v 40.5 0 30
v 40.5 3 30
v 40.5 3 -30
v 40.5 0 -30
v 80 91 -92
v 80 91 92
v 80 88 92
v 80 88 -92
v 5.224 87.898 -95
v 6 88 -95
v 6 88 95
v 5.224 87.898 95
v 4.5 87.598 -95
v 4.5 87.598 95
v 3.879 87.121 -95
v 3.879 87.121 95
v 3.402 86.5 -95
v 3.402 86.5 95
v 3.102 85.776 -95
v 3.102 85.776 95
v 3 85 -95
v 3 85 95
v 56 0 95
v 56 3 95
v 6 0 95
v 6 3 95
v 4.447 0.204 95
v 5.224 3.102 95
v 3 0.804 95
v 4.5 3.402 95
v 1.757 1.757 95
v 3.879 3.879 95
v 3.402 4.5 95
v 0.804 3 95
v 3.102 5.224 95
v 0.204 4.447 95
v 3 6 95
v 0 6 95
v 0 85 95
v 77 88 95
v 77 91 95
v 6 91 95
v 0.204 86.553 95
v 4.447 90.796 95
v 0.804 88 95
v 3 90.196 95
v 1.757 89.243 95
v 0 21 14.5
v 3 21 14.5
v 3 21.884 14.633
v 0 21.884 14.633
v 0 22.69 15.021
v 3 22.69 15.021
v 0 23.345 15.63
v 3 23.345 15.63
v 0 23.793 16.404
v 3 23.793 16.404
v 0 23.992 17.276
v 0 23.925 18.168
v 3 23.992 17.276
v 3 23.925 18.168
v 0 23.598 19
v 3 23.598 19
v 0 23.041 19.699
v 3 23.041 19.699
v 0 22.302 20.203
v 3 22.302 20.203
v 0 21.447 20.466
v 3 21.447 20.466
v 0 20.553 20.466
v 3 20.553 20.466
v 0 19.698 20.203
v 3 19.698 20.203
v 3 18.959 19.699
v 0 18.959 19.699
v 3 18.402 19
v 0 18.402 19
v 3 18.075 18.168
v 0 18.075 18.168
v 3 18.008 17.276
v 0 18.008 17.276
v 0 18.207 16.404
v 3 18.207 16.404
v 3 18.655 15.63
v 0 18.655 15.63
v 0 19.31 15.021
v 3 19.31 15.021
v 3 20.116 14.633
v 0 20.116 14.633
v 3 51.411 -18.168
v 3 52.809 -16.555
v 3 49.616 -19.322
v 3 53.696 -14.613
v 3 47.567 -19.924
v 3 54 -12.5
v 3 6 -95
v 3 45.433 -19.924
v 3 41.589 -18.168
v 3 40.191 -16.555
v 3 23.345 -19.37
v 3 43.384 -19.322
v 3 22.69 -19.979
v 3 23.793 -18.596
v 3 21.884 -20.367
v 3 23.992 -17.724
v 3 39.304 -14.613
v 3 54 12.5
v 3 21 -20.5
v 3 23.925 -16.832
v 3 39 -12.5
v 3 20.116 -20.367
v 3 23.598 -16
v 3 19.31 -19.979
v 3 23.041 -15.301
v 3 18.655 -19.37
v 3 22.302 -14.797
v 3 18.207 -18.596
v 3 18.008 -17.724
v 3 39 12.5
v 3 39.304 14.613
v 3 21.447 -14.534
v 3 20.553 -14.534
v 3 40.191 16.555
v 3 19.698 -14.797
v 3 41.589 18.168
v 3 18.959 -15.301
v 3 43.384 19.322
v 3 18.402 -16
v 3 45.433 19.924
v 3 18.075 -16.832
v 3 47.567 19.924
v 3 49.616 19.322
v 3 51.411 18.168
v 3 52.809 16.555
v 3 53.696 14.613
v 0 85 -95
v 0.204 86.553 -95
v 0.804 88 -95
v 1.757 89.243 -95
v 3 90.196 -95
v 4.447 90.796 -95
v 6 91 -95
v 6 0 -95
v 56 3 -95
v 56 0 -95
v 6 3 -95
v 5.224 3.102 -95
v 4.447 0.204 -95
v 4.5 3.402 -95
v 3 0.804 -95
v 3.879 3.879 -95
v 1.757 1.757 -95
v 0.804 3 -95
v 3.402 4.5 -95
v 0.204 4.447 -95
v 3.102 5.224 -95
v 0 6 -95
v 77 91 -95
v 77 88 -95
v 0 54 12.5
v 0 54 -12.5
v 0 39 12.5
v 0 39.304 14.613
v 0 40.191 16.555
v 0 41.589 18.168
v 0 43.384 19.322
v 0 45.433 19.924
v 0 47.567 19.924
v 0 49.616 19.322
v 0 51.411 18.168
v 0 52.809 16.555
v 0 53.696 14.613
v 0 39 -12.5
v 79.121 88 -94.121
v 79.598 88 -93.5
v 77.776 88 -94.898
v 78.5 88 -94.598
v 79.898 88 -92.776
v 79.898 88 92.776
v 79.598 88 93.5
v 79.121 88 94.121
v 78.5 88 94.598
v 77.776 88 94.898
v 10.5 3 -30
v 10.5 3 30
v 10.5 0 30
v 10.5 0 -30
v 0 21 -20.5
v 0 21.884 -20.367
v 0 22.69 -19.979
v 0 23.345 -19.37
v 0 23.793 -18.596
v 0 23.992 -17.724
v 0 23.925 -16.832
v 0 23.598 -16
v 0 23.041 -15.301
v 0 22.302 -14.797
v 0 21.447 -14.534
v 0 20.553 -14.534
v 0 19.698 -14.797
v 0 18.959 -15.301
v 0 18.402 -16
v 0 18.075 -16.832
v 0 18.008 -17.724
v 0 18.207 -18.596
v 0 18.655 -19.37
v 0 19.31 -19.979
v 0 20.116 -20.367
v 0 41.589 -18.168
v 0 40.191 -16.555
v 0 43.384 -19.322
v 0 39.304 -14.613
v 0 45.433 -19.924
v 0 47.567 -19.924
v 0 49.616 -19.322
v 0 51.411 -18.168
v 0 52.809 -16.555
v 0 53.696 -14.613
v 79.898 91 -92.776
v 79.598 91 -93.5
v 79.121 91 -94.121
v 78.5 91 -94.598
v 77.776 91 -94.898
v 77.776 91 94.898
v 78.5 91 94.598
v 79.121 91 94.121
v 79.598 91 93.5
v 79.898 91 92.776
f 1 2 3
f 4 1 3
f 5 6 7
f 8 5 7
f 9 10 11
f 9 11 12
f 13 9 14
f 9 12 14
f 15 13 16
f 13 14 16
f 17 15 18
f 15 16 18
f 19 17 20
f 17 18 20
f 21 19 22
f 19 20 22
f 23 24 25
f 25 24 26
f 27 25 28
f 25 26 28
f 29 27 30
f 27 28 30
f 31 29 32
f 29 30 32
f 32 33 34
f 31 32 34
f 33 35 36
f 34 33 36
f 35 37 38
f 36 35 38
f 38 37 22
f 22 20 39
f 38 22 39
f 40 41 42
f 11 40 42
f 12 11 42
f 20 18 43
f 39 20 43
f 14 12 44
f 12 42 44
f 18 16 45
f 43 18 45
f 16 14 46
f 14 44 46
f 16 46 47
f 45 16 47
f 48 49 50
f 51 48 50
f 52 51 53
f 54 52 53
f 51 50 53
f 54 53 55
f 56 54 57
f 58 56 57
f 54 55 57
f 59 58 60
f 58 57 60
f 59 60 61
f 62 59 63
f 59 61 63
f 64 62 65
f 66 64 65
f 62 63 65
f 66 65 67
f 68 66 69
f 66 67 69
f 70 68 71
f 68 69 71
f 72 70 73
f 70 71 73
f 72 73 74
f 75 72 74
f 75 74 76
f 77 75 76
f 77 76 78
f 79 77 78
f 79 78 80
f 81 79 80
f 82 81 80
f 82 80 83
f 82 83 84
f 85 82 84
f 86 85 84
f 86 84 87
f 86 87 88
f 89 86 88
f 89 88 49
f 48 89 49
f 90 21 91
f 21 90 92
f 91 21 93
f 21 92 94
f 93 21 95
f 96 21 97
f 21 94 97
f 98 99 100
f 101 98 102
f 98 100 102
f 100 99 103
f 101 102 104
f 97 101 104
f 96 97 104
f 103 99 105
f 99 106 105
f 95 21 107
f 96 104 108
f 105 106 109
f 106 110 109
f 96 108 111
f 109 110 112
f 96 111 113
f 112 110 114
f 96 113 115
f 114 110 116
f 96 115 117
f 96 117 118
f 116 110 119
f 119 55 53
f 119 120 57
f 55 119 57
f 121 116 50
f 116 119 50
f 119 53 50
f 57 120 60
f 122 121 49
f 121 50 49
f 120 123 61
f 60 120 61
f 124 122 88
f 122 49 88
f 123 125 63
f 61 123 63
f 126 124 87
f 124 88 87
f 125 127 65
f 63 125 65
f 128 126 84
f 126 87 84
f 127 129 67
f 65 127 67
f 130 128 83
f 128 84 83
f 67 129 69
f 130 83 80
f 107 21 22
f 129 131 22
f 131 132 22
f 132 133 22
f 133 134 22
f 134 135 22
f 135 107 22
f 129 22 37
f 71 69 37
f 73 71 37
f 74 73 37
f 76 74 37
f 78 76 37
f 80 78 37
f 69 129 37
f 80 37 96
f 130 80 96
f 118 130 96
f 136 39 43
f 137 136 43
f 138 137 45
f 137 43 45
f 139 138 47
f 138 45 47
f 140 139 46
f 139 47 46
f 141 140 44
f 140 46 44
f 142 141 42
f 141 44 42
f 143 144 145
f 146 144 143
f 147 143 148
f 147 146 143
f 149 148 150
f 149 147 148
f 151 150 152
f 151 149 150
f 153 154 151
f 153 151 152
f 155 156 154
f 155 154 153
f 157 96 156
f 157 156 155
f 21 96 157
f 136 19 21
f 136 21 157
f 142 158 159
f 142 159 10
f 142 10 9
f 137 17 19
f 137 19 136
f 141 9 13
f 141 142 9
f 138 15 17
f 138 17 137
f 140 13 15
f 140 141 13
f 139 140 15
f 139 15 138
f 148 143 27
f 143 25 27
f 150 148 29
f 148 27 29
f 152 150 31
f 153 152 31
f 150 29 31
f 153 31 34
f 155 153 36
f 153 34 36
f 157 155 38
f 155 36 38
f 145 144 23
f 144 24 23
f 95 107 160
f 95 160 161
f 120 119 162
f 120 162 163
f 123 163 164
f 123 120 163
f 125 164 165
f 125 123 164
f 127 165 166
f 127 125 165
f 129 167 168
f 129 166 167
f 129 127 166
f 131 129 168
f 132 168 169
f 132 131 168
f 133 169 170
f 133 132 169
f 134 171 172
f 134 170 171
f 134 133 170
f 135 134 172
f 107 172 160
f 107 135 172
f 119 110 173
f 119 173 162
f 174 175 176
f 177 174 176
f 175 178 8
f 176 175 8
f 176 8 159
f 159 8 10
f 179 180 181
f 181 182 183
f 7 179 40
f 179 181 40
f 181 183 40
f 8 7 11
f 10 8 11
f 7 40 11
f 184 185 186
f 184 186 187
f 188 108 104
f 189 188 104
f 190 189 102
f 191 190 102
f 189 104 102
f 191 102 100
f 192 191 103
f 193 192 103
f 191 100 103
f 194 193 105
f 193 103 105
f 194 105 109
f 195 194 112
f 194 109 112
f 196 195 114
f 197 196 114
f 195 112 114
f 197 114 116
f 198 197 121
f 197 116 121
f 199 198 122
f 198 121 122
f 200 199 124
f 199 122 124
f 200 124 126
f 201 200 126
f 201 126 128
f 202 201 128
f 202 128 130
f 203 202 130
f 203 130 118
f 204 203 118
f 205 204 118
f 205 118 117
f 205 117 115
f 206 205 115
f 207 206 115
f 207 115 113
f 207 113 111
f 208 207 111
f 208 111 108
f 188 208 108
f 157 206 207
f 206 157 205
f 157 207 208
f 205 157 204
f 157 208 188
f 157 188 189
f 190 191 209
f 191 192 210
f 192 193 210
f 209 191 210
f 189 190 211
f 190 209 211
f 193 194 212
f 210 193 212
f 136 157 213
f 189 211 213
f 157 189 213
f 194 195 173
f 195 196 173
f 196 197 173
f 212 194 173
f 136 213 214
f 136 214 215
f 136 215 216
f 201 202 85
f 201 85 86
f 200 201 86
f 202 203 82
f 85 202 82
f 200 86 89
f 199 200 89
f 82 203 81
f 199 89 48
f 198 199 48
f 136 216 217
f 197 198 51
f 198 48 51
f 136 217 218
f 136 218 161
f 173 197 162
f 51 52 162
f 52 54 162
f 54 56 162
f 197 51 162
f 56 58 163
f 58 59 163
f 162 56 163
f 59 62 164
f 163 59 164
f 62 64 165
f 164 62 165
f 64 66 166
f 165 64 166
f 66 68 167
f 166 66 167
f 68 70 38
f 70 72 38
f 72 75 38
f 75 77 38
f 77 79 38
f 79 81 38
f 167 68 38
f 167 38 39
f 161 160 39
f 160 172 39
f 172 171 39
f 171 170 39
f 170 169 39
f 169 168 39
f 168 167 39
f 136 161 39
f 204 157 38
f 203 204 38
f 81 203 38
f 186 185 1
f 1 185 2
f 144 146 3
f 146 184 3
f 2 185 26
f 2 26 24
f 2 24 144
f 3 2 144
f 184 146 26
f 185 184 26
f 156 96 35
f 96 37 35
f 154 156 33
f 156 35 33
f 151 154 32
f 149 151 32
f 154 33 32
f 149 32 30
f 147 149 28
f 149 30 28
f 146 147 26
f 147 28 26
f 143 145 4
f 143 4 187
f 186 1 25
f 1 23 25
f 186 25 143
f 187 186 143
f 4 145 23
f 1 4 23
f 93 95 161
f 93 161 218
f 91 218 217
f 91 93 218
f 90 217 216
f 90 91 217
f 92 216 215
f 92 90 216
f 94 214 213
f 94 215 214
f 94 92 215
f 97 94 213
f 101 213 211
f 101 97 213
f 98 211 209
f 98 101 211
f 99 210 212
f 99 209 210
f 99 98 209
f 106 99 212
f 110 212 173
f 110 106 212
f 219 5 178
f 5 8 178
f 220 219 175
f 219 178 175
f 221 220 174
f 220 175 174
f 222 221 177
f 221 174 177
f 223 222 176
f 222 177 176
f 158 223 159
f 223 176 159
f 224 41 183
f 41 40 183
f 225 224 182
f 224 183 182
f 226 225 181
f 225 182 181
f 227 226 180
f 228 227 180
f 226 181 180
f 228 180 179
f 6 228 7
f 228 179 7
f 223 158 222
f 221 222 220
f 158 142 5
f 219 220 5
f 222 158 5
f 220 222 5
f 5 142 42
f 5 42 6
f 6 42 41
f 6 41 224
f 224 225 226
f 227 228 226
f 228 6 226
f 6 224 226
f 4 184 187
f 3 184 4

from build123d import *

# Parameters (mm, degrees)
BOSS_EXTRUDE1_DEPTH = 95
FILLET2_R           = 3
CUT_EXTRUDE2_REACH  = 154.43
CUT_EXTRUDE4_REACH  = 154.214
SKETCH7_W           = 30
SKETCH7_H           = 60
CUT_EXTRUDE5_REACH  = 154.43
SKETCH2_R           = 3


with BuildPart() as part:
    # Sketch1 → Boss-Extrude1 (new, symmetric)
    with BuildSketch(Plane.XY):
        with BuildLine():
            Line((6, 91), (80, 91))
            Line((80, 91), (80, 88))
            Line((80, 88), (6, 88))
            ThreePointArc((6, 88), (3.878679656, 87.121320344), (3, 85))
            Line((3, 85), (3, 6))
            ThreePointArc((3, 6), (3.878679656, 3.878679656), (6, 3))
            Line((6, 3), (56, 3))
            Line((56, 3), (56, 0))
            Line((56, 0), (6, 0))
            ThreePointArc((6, 0), (1.757359313, 1.757359313), (0, 6))
            Line((0, 6), (0, 85))
            ThreePointArc((0, 85), (1.757359313, 89.242640687), (6, 91))
        make_face()
    extrude(amount=BOSS_EXTRUDE1_DEPTH, both=True)

    # Fillet2
    fillet2_edges = [part.edges().sort_by_distance(p)[0] for p in [
        (80, 89.5, 95),
        (80, 89.5, -95),
    ]]
    fillet(fillet2_edges, radius=FILLET2_R)

    # Sketch5 → Cut-Extrude2 (cut, up to next)
    with BuildSketch(Plane(origin=(3, 0, 0), x_dir=(0, 0, -1), z_dir=(1, 0, 0)), mode=Mode.PRIVATE) as cut_extrude2_sk1:
        with BuildLine():
            Line((-12.5, 54), (12.5, 54))
            ThreePointArc((12.5, 54), (20, 46.5), (12.5, 39))
            Line((12.5, 39), (-12.5, 39))
            ThreePointArc((-12.5, 39), (-20, 46.5), (-12.5, 54))
        make_face()
    cut_extrude2_tool1 = extrude(cut_extrude2_sk1.sketch, amount=-CUT_EXTRUDE2_REACH, mode=Mode.PRIVATE) & part.part
    add(cut_extrude2_tool1.solids().sort_by_distance((3, 46.5, 0))[0], mode=Mode.SUBTRACT)

    # Sketch7 → Cut-Extrude4 (cut, up to next)
    with BuildSketch(Plane(origin=(0, 3, 0), x_dir=(1, 0, 0), z_dir=(0, 1, 0)), mode=Mode.PRIVATE) as cut_extrude4_sk1:
        with Locations((25.5, 0)):
            Rectangle(SKETCH7_W, SKETCH7_H)
    cut_extrude4_tool1 = extrude(cut_extrude4_sk1.sketch, amount=-CUT_EXTRUDE4_REACH, mode=Mode.PRIVATE) & part.part
    add(cut_extrude4_tool1.solids().sort_by_distance((25.5, 3, 0))[0], mode=Mode.SUBTRACT)

    # Sketch2 → Cut-Extrude5 (cut, up to next)
    with BuildSketch(Plane(origin=(3, 0, 0), x_dir=(0, 0, -1), z_dir=(1, 0, 0)), mode=Mode.PRIVATE) as cut_extrude5_sk1:
        with Locations((-17.5, 21)):
            Circle(SKETCH2_R)
    cut_extrude5_tool1 = extrude(cut_extrude5_sk1.sketch, amount=-CUT_EXTRUDE5_REACH, mode=Mode.PRIVATE) & part.part
    # Sketch2 → Cut-Extrude5 (cut, up to next)
    with BuildSketch(Plane(origin=(3, 0, 0), x_dir=(0, 0, -1), z_dir=(1, 0, 0)), mode=Mode.PRIVATE) as cut_extrude5_sk2:
        with Locations((17.5, 21)):
            Circle(SKETCH2_R)
    cut_extrude5_tool2 = extrude(cut_extrude5_sk2.sketch, amount=-CUT_EXTRUDE5_REACH, mode=Mode.PRIVATE) & part.part
    add(cut_extrude5_tool1.solids().sort_by_distance((3, 21, 17.5))[0], mode=Mode.SUBTRACT)
    add(cut_extrude5_tool2.solids().sort_by_distance((3, 21, -17.5))[0], mode=Mode.SUBTRACT)


solid = part.part
